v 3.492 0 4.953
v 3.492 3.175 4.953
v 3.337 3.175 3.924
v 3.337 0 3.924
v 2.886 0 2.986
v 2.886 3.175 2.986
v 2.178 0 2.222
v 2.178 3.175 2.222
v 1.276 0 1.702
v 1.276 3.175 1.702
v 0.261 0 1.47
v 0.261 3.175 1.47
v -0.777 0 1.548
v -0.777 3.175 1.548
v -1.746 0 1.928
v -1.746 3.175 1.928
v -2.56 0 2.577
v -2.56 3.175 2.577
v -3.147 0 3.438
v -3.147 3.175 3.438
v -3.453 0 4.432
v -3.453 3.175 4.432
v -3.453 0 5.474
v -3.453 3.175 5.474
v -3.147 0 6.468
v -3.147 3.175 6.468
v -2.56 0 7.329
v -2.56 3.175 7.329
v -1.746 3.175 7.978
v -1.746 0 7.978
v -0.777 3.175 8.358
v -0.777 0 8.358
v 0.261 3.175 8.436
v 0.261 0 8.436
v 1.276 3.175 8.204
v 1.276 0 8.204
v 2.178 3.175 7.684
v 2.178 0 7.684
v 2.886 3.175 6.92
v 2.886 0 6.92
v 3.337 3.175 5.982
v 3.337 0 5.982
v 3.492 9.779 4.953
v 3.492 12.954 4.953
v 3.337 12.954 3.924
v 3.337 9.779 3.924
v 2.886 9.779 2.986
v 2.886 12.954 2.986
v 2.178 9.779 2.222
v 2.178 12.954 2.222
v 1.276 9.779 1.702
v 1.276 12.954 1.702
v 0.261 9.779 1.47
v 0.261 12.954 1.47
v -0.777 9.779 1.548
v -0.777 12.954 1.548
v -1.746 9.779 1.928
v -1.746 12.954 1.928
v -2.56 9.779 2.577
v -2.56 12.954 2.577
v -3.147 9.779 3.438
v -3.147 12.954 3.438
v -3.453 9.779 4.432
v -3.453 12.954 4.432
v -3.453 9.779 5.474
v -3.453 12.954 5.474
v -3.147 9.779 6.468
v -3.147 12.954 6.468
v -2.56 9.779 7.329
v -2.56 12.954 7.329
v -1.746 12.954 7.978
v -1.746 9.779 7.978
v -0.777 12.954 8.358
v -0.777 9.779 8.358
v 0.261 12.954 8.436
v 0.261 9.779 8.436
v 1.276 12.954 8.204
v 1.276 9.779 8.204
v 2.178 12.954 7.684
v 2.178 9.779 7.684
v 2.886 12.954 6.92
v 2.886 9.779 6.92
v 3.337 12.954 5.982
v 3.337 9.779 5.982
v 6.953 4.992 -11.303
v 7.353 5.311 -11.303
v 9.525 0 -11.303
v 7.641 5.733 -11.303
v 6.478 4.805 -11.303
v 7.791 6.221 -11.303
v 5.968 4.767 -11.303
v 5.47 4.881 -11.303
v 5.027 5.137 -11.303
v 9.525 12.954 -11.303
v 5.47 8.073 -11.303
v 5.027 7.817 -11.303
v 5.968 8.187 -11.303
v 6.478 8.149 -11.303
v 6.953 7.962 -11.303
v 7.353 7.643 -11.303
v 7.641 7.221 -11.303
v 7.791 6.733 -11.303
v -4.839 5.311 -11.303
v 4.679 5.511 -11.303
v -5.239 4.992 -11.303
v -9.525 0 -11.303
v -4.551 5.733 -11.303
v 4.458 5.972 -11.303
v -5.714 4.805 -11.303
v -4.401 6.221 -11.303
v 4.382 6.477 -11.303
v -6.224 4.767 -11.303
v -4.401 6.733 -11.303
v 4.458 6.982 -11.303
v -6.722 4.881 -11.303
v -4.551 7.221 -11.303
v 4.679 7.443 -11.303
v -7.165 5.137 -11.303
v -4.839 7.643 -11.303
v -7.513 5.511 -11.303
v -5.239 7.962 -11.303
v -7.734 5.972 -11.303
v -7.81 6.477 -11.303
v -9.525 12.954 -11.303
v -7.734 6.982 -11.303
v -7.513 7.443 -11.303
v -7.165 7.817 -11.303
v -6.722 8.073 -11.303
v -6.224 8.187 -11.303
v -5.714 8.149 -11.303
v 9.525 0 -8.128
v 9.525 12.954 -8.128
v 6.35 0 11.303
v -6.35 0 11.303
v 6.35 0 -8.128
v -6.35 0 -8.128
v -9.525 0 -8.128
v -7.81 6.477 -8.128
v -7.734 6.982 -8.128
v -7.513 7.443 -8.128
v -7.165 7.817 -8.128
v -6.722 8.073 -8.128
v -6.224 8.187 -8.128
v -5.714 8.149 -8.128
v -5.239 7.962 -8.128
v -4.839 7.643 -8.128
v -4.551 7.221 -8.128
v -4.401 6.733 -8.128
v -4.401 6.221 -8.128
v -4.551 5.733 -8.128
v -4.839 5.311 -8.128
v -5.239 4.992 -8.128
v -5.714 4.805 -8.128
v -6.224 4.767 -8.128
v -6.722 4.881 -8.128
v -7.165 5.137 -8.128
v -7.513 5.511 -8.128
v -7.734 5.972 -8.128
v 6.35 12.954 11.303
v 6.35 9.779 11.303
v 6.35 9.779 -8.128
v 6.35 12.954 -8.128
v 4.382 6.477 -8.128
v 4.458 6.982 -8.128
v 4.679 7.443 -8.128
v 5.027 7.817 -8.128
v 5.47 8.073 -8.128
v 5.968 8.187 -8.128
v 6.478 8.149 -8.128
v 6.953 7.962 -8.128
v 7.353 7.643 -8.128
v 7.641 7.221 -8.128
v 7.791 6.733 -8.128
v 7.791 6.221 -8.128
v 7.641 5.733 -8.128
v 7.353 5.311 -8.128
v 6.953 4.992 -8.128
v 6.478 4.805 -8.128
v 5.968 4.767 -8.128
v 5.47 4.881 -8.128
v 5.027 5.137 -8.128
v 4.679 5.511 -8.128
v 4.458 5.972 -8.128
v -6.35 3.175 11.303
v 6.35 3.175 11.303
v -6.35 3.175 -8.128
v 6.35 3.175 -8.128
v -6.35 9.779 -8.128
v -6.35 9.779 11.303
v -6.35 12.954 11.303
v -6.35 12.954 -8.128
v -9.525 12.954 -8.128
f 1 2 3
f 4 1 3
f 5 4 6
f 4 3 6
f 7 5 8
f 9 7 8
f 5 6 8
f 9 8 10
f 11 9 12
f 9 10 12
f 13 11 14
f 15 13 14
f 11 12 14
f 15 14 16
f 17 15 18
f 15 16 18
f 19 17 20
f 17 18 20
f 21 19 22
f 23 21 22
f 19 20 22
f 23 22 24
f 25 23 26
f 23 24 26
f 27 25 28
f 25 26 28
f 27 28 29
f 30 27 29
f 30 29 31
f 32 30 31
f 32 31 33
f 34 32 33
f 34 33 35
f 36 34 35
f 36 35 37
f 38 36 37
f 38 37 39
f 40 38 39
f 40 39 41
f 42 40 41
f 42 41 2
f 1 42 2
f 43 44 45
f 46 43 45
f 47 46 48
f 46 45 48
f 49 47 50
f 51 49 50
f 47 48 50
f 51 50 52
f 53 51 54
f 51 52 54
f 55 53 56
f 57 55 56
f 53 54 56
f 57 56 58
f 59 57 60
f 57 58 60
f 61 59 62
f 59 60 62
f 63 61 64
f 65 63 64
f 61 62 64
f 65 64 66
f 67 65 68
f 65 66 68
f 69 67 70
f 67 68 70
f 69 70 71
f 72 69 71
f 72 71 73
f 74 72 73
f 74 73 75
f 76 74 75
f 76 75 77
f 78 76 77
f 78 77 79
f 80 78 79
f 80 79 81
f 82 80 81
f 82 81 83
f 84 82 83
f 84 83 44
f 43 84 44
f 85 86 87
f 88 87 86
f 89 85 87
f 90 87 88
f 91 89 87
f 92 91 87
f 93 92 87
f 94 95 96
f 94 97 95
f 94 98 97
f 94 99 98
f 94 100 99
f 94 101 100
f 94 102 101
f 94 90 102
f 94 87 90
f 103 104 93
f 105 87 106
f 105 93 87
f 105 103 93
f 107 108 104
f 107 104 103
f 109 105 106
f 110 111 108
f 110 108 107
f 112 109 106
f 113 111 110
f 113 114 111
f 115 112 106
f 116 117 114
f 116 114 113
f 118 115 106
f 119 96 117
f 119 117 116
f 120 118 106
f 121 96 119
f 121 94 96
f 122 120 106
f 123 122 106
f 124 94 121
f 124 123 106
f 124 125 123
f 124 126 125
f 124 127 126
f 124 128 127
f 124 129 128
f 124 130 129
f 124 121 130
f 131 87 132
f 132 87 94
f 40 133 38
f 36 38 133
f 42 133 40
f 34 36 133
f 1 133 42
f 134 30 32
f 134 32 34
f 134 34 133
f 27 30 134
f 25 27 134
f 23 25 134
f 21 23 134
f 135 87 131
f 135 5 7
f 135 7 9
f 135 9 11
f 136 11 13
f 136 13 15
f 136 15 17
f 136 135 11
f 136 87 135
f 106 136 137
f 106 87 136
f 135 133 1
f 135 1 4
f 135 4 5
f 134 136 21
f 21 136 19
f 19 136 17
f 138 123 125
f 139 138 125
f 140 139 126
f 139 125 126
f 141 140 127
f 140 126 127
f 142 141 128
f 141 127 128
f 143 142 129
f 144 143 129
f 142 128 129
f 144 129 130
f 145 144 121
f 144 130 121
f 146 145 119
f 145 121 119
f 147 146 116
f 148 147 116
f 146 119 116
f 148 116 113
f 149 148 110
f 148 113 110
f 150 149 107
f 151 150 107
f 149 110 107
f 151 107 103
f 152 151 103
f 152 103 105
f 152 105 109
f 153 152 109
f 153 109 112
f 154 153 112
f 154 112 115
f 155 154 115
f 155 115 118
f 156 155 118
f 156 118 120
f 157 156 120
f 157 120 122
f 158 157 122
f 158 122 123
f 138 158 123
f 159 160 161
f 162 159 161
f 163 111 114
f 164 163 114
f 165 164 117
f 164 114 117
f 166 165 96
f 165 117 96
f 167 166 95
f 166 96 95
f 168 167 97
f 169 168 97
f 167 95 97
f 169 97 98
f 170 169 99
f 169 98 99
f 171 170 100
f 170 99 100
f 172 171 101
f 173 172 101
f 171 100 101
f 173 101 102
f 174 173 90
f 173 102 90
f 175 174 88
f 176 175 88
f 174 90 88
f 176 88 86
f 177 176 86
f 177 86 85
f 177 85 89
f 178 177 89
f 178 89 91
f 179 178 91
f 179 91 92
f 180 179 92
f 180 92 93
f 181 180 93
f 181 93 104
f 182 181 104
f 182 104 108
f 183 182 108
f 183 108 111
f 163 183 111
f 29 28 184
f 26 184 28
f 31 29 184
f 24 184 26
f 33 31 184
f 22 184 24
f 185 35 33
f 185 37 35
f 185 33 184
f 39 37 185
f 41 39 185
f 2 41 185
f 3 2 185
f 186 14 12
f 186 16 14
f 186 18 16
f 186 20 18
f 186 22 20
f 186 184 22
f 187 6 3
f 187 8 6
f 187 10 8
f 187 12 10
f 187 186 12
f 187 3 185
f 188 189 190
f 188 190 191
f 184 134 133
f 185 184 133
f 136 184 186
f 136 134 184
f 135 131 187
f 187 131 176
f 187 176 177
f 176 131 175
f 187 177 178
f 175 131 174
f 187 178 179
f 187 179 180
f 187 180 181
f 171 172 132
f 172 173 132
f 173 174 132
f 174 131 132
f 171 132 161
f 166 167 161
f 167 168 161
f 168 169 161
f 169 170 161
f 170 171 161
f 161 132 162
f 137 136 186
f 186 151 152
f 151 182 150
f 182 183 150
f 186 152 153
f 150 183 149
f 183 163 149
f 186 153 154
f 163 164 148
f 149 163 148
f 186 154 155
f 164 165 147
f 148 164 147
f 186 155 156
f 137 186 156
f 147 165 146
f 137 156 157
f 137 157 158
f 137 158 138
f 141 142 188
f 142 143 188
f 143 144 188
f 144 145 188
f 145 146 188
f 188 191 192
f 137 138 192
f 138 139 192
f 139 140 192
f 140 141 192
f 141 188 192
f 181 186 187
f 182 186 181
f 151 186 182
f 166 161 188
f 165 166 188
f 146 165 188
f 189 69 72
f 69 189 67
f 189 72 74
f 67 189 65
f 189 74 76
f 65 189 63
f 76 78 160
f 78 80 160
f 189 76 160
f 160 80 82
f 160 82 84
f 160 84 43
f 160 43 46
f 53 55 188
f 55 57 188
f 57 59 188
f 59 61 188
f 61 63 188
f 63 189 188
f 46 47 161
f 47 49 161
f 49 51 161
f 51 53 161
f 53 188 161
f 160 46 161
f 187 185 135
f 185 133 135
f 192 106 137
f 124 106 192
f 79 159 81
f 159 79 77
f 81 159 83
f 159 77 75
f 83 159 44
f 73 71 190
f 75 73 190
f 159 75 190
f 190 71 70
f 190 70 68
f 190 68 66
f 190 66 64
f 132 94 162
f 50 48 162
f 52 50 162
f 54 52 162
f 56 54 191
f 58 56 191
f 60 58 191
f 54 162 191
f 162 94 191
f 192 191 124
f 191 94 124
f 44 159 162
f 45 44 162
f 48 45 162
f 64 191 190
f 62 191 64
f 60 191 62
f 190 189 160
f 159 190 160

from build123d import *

# Parameters (mm, degrees)
SKETCH1_W                  = 12.7
SKETCH1_H                  = 22.606
BOSS_EXTRUDE1_DEPTH        = 3.175
SKETCH2_W                  = 12.7
SKETCH2_H                  = 3.175
BOSS_EXTRUDE2_DEPTH        = 6.604
SKETCH3_W                  = 12.7
SKETCH3_H                  = 22.606
BOSS_EXTRUDE3_DEPTH        = 3.175
SKETCH4_R                  = 3.4925
CUT_EXTRUDE1_DEPTH         = 13.954
SKETCH6_W                  = 3.175
SKETCH6_H                  = 12.954
BOSS_EXTRUDE4_DEPTH        = 3.175
SKETCH5_R                  = 1.7145
CUT_FOR_MOUNT_SCREWS_DEPTH = 23.606


with BuildPart() as part:
    # Sketch1 → Boss-Extrude1 (new body)
    with BuildSketch(Plane(origin=(0, 0, 0), x_dir=(1, 0, 0), z_dir=(0, 1, 0))):
        Rectangle(SKETCH1_W, SKETCH1_H)
    extrude(amount=BOSS_EXTRUDE1_DEPTH)

    # Sketch2 → Boss-Extrude2 (add)
    with BuildSketch(Plane(origin=(0, 3.175, 0), x_dir=(1, 0, 0), z_dir=(0, 1, 0))):
        with Locations((0, 9.7155)):
            Rectangle(SKETCH2_W, SKETCH2_H)
    extrude(amount=BOSS_EXTRUDE2_DEPTH)

    # Sketch3 → Boss-Extrude3 (add)
    with BuildSketch(Plane(origin=(0, 9.779, 0), x_dir=(1, 0, 0), z_dir=(0, 1, 0))):
        Rectangle(SKETCH3_W, SKETCH3_H)
    extrude(amount=BOSS_EXTRUDE3_DEPTH)

    # Sketch4 → Cut-Extrude1 (cut, through all)
    with BuildSketch(Plane(origin=(0, 12.954, 0), x_dir=(1, 0, 0), z_dir=(0, 1, 0))):
        with Locations((0, -4.953)):
            Circle(SKETCH4_R)
    extrude(amount=-CUT_EXTRUDE1_DEPTH, mode=Mode.SUBTRACT)

    # Sketch6 → Boss-Extrude4 (add)
    with BuildSketch(Plane(origin=(0, 0, -11.303), x_dir=(-1, 0, 0), z_dir=(0, 0, -1))):
        with Locations((-7.9375, 6.477)):
            Rectangle(SKETCH6_W, SKETCH6_H)
        with Locations((7.9375, 6.477)):
            Rectangle(SKETCH6_W, SKETCH6_H)
    extrude(amount=-BOSS_EXTRUDE4_DEPTH)

    # Sketch5 → cut for mount screws (cut, through all)
    with BuildSketch(Plane(origin=(0, 0, -11.303), x_dir=(-1, 0, 0), z_dir=(0, 0, -1))):
        with Locations((6.096, 6.477)):
            Circle(SKETCH5_R)
        with Locations((-6.096, 6.477)):
            Circle(SKETCH5_R)
    extrude(amount=-CUT_FOR_MOUNT_SCREWS_DEPTH, mode=Mode.SUBTRACT)


solid = part.part
